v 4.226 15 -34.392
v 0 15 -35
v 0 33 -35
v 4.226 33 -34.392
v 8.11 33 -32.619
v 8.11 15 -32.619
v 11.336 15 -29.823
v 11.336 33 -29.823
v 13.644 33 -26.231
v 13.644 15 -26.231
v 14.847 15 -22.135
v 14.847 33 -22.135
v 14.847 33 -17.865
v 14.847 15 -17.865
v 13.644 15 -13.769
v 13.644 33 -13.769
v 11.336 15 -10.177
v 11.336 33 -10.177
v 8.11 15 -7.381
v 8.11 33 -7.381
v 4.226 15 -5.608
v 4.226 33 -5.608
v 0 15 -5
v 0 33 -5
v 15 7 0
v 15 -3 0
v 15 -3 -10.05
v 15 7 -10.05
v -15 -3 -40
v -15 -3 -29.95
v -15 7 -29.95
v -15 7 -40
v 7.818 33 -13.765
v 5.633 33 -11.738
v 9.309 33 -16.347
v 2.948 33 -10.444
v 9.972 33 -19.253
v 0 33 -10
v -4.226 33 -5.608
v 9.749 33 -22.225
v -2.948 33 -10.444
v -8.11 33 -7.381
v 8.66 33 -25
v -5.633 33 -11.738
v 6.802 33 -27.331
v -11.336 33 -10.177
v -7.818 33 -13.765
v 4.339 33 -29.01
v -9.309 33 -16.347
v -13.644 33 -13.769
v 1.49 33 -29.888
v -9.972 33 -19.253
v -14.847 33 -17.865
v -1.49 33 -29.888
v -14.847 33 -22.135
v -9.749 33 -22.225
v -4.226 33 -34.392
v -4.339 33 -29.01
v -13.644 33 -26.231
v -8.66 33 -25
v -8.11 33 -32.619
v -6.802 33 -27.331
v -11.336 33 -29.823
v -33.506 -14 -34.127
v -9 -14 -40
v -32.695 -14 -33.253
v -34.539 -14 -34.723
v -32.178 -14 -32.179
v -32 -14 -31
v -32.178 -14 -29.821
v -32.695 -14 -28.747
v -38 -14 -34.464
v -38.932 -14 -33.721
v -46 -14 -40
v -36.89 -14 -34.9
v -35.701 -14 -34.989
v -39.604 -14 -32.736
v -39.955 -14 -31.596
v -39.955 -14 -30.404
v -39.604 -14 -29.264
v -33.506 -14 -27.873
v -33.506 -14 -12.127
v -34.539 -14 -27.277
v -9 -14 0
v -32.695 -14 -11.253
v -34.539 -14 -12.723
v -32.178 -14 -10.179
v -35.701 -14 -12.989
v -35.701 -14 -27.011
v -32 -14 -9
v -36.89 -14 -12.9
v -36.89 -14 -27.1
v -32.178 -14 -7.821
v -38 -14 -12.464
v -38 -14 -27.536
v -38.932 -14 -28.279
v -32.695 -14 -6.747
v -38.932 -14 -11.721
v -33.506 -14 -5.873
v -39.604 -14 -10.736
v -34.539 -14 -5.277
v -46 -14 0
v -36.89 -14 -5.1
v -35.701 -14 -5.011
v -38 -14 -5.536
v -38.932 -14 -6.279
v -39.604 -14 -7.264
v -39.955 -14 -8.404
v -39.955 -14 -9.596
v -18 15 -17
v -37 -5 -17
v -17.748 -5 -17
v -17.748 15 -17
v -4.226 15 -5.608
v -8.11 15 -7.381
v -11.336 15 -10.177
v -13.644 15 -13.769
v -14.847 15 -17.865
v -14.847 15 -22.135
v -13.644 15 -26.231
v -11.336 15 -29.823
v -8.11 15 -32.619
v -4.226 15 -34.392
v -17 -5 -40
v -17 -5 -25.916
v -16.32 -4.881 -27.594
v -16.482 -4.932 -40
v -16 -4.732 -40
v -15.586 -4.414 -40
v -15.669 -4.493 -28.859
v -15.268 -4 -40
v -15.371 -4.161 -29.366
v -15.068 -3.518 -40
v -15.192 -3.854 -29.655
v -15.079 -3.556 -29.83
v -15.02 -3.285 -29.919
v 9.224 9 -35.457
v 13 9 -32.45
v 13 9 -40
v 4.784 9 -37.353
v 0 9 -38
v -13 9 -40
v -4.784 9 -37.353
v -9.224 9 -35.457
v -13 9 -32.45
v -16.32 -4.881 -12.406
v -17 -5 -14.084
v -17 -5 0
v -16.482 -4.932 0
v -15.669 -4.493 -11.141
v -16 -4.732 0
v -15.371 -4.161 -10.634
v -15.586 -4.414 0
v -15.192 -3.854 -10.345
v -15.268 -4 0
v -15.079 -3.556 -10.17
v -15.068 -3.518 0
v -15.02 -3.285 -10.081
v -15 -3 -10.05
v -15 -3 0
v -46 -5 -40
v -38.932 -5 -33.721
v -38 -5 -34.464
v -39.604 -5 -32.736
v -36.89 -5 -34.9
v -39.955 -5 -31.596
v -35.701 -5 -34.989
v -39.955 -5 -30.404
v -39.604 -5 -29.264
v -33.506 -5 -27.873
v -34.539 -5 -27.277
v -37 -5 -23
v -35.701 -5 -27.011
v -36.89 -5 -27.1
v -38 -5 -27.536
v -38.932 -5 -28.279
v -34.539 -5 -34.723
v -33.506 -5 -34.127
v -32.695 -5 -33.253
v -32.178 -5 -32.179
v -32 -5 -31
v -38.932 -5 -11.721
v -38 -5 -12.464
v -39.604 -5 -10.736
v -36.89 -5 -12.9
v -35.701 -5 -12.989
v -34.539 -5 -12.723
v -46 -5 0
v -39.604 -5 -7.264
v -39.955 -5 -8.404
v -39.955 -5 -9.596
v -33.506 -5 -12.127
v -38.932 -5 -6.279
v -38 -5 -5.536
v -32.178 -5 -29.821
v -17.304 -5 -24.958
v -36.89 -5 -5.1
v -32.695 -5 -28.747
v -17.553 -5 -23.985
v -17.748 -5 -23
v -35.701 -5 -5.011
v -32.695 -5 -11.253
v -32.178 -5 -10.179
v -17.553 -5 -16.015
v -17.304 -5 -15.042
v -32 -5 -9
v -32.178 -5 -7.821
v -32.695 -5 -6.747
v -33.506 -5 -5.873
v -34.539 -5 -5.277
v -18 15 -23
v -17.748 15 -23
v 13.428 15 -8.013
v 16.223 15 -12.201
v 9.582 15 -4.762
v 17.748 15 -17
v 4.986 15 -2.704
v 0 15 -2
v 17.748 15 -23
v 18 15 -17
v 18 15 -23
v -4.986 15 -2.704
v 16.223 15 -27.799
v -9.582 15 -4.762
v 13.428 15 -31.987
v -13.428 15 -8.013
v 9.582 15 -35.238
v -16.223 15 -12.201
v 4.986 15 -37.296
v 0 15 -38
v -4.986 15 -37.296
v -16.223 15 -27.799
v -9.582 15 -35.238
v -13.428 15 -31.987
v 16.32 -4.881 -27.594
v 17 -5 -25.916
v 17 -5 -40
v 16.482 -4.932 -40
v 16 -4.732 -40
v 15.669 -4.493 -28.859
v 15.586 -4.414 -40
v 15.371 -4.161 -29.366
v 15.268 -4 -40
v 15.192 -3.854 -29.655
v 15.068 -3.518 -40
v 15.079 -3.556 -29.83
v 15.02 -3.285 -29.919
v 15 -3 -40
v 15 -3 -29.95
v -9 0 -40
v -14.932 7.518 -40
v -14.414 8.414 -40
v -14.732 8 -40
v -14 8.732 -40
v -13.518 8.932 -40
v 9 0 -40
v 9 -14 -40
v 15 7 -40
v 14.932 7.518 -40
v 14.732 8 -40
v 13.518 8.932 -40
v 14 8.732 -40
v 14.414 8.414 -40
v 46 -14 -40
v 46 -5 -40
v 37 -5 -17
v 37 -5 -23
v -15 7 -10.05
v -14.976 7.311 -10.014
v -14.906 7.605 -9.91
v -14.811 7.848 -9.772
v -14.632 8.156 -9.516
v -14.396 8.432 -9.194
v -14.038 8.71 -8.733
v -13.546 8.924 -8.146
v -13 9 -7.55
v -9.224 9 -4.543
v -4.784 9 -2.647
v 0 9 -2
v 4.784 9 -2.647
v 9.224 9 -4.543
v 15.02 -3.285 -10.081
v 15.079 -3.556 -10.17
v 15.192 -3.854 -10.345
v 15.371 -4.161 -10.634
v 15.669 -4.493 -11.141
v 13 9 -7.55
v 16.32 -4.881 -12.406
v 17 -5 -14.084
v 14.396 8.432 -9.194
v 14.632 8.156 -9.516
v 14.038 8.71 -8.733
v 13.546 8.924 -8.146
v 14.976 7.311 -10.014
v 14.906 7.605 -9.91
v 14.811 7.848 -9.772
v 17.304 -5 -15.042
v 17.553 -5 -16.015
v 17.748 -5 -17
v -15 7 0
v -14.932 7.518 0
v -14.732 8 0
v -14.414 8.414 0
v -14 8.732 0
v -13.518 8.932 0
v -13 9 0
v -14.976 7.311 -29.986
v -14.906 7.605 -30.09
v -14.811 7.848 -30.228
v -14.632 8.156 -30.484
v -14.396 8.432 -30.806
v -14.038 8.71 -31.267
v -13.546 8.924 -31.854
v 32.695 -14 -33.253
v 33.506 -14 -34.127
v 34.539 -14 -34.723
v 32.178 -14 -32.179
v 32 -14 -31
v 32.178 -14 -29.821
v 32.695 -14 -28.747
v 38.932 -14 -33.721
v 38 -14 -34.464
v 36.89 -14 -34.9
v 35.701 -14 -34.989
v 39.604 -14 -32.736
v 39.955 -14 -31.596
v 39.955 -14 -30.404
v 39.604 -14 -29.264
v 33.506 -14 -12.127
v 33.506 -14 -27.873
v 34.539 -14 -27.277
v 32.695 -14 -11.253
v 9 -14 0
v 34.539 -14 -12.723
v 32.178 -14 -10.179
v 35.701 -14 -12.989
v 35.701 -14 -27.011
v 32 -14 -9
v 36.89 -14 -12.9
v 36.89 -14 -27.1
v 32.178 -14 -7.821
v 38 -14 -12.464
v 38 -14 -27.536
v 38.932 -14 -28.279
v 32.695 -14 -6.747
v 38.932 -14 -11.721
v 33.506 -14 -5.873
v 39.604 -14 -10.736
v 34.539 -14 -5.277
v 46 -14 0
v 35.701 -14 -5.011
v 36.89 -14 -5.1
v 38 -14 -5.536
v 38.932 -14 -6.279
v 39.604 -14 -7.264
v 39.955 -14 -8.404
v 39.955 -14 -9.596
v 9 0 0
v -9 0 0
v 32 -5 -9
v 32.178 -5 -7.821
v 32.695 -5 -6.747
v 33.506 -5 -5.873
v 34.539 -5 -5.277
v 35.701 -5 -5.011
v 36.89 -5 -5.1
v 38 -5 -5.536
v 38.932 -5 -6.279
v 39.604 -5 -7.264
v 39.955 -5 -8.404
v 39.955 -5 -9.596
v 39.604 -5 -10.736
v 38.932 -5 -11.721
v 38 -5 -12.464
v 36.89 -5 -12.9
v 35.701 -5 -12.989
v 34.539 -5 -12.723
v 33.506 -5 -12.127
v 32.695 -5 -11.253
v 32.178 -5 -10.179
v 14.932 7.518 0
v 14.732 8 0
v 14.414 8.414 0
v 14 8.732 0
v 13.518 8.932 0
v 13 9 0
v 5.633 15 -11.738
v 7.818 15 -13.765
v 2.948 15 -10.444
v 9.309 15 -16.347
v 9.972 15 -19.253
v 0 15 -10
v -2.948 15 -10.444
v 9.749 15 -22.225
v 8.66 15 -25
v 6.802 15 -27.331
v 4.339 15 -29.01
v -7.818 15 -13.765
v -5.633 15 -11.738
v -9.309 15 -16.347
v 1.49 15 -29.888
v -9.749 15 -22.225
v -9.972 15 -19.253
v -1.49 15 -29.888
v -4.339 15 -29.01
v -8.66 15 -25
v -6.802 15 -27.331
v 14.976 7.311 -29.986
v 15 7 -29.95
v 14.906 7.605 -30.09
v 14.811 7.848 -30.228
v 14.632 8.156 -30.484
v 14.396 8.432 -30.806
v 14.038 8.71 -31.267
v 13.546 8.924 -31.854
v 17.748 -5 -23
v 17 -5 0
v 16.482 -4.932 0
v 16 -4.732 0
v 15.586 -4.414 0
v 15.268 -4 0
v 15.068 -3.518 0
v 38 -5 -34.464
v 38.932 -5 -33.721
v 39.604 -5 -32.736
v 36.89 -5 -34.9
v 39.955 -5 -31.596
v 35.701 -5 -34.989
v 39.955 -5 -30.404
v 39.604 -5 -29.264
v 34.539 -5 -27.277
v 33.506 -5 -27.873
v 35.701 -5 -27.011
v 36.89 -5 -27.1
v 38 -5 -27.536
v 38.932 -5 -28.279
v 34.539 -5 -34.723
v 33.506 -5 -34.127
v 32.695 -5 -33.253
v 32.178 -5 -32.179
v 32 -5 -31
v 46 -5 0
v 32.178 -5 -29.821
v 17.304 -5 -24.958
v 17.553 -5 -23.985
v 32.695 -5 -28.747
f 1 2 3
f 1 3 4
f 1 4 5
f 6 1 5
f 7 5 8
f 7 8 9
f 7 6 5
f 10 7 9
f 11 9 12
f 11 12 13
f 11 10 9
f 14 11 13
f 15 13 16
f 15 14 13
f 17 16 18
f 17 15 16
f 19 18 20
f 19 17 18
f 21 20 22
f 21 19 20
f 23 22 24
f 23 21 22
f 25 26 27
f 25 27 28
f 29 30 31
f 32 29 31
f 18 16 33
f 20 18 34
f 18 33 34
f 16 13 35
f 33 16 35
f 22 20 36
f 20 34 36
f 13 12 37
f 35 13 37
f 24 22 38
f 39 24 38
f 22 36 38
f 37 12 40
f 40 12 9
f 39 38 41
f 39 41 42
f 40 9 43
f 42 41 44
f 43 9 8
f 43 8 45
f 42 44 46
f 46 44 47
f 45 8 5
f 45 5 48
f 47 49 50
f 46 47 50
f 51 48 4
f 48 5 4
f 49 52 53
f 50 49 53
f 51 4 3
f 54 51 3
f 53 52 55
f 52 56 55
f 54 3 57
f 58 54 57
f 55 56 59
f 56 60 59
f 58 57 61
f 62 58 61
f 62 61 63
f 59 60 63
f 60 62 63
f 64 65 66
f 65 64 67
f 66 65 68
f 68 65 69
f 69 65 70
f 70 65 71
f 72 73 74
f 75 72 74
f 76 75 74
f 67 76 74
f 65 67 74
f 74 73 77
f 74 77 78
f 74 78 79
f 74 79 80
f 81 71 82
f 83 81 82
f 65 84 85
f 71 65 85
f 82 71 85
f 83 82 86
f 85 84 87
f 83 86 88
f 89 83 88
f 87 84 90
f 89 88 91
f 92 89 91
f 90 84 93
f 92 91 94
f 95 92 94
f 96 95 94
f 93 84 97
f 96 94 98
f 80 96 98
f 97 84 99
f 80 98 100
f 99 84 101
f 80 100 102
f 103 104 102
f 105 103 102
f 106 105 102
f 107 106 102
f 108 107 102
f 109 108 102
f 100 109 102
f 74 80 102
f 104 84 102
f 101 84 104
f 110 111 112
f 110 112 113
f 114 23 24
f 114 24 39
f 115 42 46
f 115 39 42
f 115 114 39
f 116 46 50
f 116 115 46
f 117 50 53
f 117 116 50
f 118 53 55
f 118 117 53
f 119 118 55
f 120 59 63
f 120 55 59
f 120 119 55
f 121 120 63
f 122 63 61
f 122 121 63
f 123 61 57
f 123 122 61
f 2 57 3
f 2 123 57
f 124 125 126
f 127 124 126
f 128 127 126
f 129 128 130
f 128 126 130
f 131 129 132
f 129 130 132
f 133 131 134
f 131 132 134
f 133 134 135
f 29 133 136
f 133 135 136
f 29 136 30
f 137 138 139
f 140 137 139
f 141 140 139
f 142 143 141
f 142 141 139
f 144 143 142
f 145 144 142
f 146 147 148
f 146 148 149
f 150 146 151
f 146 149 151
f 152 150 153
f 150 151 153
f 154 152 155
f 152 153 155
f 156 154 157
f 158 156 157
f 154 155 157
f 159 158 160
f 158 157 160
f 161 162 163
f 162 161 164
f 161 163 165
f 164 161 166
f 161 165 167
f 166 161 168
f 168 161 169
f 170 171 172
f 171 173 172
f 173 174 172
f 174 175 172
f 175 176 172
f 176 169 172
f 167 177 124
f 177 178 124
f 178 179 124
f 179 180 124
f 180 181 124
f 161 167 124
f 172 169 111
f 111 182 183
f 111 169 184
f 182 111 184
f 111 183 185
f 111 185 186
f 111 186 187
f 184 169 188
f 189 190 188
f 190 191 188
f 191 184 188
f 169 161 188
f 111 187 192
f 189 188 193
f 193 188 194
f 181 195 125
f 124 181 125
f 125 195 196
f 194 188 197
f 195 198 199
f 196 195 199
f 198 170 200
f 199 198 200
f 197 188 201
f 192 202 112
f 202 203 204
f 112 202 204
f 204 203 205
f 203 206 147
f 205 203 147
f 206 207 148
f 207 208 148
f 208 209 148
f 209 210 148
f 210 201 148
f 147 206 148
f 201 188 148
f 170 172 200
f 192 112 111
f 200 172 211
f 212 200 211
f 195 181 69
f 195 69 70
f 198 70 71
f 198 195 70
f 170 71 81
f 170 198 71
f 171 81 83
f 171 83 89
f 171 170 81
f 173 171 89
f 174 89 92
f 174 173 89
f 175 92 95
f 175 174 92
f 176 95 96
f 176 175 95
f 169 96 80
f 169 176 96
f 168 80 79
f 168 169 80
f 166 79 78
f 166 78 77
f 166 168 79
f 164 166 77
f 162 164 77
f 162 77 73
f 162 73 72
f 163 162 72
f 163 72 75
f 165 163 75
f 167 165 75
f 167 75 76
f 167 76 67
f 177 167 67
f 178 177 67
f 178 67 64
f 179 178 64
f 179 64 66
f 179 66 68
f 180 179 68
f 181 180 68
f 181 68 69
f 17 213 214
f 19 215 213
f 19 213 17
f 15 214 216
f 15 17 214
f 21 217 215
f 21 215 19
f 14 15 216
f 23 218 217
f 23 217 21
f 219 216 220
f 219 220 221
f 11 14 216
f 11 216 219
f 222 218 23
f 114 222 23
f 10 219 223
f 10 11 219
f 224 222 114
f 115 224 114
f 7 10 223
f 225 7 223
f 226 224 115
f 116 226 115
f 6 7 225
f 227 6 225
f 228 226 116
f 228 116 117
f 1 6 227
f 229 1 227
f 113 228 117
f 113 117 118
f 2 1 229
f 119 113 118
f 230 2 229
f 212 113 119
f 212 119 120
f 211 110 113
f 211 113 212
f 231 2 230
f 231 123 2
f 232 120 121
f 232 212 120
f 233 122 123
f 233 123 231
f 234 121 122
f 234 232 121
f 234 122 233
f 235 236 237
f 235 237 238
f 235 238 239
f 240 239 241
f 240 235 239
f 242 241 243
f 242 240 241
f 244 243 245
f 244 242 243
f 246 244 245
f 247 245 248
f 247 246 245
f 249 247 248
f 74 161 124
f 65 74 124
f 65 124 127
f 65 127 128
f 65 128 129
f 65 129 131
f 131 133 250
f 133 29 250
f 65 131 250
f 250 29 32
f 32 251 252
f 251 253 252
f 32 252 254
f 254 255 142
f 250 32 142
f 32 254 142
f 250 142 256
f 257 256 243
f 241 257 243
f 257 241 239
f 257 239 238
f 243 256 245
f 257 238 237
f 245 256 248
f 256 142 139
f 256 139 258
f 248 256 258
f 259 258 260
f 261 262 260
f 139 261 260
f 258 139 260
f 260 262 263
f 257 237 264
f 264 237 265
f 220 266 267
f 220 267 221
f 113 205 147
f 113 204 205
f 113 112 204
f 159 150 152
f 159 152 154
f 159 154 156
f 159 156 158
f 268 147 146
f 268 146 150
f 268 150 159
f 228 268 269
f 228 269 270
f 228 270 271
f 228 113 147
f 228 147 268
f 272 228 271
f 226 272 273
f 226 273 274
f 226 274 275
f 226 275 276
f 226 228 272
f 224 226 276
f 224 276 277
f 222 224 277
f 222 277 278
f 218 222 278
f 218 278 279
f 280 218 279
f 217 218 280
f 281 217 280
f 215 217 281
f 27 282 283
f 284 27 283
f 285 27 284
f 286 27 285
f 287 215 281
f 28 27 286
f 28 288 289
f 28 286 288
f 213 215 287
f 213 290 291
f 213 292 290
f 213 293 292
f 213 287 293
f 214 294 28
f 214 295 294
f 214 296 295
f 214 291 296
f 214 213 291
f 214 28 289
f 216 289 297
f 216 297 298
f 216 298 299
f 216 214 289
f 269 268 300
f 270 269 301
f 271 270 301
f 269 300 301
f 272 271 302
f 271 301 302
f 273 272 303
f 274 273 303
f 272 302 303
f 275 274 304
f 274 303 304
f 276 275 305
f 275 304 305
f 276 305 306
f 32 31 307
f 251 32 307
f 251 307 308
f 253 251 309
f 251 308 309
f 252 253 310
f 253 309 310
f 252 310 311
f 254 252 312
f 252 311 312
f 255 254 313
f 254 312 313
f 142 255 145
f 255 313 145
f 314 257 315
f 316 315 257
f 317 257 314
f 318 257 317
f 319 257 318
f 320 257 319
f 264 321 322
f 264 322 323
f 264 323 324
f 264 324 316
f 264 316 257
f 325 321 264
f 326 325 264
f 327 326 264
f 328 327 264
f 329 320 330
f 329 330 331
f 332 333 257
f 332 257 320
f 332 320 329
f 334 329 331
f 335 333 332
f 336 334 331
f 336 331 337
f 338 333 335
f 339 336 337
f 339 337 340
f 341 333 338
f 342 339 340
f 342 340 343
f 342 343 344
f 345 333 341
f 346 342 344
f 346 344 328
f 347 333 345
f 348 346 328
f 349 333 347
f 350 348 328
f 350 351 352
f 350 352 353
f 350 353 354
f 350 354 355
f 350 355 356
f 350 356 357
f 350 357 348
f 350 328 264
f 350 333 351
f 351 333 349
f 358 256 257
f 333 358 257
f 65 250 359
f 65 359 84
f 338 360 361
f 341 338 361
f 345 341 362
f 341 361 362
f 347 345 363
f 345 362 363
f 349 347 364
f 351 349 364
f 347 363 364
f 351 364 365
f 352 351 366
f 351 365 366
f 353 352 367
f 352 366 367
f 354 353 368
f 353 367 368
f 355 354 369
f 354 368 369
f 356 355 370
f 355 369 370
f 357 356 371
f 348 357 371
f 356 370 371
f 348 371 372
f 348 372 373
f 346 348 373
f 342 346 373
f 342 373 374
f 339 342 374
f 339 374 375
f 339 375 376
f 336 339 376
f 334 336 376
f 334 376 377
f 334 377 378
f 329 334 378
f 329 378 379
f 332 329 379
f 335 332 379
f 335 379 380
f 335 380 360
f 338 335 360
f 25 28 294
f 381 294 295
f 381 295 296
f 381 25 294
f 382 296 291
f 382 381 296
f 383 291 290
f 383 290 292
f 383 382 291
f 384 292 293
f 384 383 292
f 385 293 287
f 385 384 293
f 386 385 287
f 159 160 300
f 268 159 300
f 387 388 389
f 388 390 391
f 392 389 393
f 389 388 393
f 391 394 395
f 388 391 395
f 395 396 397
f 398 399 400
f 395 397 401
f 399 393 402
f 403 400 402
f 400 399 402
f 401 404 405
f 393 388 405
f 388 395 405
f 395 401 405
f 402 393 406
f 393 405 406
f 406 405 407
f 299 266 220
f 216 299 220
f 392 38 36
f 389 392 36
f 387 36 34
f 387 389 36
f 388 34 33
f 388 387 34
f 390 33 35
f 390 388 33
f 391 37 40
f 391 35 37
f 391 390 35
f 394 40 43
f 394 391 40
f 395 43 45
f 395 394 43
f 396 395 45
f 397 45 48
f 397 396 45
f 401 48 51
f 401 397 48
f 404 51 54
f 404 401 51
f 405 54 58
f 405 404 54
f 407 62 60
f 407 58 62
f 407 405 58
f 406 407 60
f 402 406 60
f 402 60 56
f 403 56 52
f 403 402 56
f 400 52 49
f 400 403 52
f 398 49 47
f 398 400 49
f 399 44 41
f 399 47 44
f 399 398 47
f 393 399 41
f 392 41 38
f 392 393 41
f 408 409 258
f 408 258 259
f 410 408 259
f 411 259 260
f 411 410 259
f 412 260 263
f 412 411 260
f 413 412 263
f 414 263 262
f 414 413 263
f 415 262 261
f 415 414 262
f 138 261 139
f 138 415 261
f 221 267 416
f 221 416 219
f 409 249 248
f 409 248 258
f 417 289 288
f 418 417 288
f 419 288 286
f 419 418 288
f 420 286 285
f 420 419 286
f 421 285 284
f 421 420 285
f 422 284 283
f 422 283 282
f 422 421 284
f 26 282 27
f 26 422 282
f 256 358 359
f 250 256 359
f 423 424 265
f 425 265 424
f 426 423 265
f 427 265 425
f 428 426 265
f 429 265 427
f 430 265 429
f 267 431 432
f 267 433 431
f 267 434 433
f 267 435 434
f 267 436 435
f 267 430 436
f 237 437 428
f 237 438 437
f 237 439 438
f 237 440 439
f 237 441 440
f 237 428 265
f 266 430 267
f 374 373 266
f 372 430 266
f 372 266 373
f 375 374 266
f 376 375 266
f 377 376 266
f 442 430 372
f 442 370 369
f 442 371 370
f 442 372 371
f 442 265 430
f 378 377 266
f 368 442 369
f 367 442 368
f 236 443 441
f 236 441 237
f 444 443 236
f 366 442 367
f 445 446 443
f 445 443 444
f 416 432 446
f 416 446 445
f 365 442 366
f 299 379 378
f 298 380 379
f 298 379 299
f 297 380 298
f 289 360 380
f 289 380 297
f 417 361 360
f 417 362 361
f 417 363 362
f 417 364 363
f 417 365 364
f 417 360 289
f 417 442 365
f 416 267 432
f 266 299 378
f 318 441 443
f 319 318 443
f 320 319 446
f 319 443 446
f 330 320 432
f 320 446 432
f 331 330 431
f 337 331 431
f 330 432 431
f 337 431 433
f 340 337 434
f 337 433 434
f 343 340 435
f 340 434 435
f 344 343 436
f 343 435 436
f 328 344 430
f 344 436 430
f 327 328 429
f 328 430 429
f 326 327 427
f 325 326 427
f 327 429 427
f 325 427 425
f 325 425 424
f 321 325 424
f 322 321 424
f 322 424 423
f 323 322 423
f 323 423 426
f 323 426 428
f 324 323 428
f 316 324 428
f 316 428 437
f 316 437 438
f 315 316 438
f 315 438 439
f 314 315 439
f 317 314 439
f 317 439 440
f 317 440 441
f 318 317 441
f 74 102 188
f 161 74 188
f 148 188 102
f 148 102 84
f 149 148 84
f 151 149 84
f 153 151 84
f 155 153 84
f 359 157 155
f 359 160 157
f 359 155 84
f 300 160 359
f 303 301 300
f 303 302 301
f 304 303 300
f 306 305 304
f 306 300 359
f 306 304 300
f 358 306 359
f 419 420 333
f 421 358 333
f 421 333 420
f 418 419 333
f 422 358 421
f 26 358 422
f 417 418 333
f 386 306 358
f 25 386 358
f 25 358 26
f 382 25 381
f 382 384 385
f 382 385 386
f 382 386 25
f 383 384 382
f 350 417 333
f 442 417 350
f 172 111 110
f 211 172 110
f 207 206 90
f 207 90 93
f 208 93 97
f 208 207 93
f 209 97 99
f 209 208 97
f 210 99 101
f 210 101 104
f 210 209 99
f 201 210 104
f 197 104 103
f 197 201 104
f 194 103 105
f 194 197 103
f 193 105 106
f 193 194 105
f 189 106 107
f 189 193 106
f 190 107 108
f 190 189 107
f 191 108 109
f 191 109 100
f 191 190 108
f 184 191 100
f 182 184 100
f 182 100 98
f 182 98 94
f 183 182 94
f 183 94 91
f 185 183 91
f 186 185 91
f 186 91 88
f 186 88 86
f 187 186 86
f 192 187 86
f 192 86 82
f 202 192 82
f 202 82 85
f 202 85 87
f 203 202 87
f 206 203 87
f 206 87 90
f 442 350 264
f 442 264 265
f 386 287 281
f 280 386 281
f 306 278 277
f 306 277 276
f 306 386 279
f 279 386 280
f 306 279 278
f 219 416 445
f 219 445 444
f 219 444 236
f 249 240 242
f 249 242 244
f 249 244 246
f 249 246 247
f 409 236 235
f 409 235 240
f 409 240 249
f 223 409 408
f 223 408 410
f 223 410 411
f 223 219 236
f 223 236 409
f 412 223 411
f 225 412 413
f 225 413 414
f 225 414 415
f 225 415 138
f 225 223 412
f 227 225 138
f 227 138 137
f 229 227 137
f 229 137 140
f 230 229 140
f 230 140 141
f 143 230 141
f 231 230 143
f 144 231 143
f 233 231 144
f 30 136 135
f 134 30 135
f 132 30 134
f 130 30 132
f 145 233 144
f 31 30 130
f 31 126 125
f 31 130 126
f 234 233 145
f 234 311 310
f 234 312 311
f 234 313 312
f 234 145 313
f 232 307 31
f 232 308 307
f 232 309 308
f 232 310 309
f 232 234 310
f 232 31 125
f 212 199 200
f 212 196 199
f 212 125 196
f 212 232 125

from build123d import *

# Parameters (mm, degrees)
BOSS_EXTRUDE1_DEPTH = 40
SKETCH2_R           = 4
CUT_EXTRUDE1_DEPTH  = 40
SKETCH3_R           = 4
CUT_EXTRUDE2_DEPTH  = 40
BOSS_EXTRUDE4_DEPTH = 18
BOSS_EXTRUDE5_REACH = 69.506
RIB7_REACH          = 62.042
SKETCH14_WALL_W     = 149.669532934
SKETCH14_WALL_H     = 6
CUT_EXTRUDE7_DEPTH  = 30
CUT_EXTRUDE8_START  = 30
SKETCH18_R          = 18
SKETCH18_R_2        = 15
CUT_EXTRUDE8_DEPTH  = 30
SKETCH16_R          = 18
SKETCH16_R_2        = 15
CUT_EXTRUDE5_DEPTH  = 18


with BuildPart() as part:
    # Sketch1 → Boss-Extrude1 (new body)
    with BuildSketch(Plane.XY):
        with BuildLine():
            Line((0, 0), (9, 0))
            Line((9, 0), (9, -14))
            Line((9, -14), (46, -14))
            Line((46, -14), (46, -5))
            Line((46, -5), (17, -5))
            ThreePointArc((17, -5), (15.585786438, -4.414213562), (15, -3))
            Line((15, -3), (15, 7))
            ThreePointArc((15, 7), (14.414213562, 8.414213562), (13, 9))
            Line((13, 9), (0, 9))
            Line((0, 9), (0, 0))
        make_face()
    extrude(amount=-BOSS_EXTRUDE1_DEPTH)

    # Sketch2 → Cut-Extrude1 (cut)
    with BuildSketch(Plane(origin=(0, -5, 0), x_dir=(1, 0, 0), z_dir=(0, 1, 0))):
        with Locations(Location((36, 9, 0), (0, 0, 180))):
            Circle(SKETCH2_R)
    extrude(amount=-CUT_EXTRUDE1_DEPTH, mode=Mode.SUBTRACT)

    # Sketch3 → Cut-Extrude2 (cut)
    with BuildSketch(Plane(origin=(0, -5, 0), x_dir=(1, 0, 0), z_dir=(0, 1, 0))):
        with Locations(Location((36, 31, 0), (0, 0, 180))):
            Circle(SKETCH3_R)
    extrude(amount=-CUT_EXTRUDE2_DEPTH, mode=Mode.SUBTRACT)

    # Sketch7 → Boss-Extrude5 (add, up to next)
    with BuildSketch(Plane(origin=(0, 15, 0), x_dir=(1, 0, 0), z_dir=(0, 1, 0)), mode=Mode.PRIVATE) as boss_extrude5_sk1:
        with BuildLine():
            Line((0, 2), (0, 20))
            Line((0, 20), (0, 38))
            ThreePointArc((0, 38), (18, 20), (0, 2))
        make_face()
    boss_extrude5_tool1 = extrude(boss_extrude5_sk1.sketch, amount=-BOSS_EXTRUDE5_REACH, mode=Mode.PRIVATE) - part.part


with BuildPart() as body_2:
    # Sketch4 → Boss-Extrude4 (new body)
    with BuildSketch(Plane(origin=(0, 15, 0), x_dir=(1, 0, 0), z_dir=(0, 1, 0))):
        with BuildLine():
            Line((0, 30), (0, 35))
            ThreePointArc((0, 35), (15, 20), (0, 5))
            Line((0, 5), (0, 10))
            ThreePointArc((0, 10), (10, 20), (0, 30))
        make_face()
    extrude(amount=BOSS_EXTRUDE4_DEPTH)


with BuildPart() as part_1:
    add(part.part)

    add(body_2.part)  # Boss-Extrude5 merges body 2
    add(boss_extrude5_tool1.solids().sort_by_distance((7.639437, 15, -20))[0])

    # Sketch14 wall → Rib7 (add, up to next)
    with BuildSketch(Plane(origin=(27.5, 5, -20), x_dir=(-0.688749461915, 0.724999433594, 0), z_dir=(0.724999433594, 0.688749461915, 0)), mode=Mode.PRIVATE) as rib7_sk1:
        Rectangle(SKETCH14_WALL_W, SKETCH14_WALL_H)
    rib7_tool1 = extrude(rib7_sk1.sketch, amount=-RIB7_REACH, mode=Mode.PRIVATE) - part_1.part
    add(rib7_tool1.solids().sort_by_distance((27.5, 5, -20))[0])

    # Sketch17 → Cut-Extrude7 (cut)
    with BuildSketch(Plane(origin=(46, 0, 0), x_dir=(0, 0, -1), z_dir=(1, 0, 0))):
        Polygon((20, 15), (35.006710278, 15), (35.006710278, 24.792153867), (20, 24.792153867), (5.167377758, 24.792153867), (5.167377758, 15), align=None)
    extrude(amount=-CUT_EXTRUDE7_DEPTH, mode=Mode.SUBTRACT)

    # Sketch18 → Cut-Extrude8 (cut)
    with BuildSketch(Plane(origin=(0, 15, 0), x_dir=(1, 0, 0), z_dir=(0, 1, 0)).offset(CUT_EXTRUDE8_START)):
        with Locations((0, 20)):
            Circle(SKETCH18_R)
        with Locations((0, 20)):
            Circle(SKETCH18_R_2, mode=Mode.SUBTRACT)
    extrude(amount=-CUT_EXTRUDE8_DEPTH, mode=Mode.SUBTRACT)

    # Mirror13: part across plane


with BuildPart() as part_2:
    add(part_1.part)
    add(part_1.part.mirror(Plane(origin=(0, 0, -40), x_dir=(0, 0, 1), z_dir=(-1, 0, 0))))

    # Sketch16 → Cut-Extrude5 (cut)
    with BuildSketch(Plane(origin=(0, 15, 0), x_dir=(1, 0, 0), z_dir=(0, 1, 0))):
        with Locations((0, 20)):
            Circle(SKETCH16_R)
        with Locations(Location((0, 20, 0), (0, 0, 180))):
            Circle(SKETCH16_R_2, mode=Mode.SUBTRACT)
    extrude(amount=CUT_EXTRUDE5_DEPTH, mode=Mode.SUBTRACT)


solid = part_2.part
